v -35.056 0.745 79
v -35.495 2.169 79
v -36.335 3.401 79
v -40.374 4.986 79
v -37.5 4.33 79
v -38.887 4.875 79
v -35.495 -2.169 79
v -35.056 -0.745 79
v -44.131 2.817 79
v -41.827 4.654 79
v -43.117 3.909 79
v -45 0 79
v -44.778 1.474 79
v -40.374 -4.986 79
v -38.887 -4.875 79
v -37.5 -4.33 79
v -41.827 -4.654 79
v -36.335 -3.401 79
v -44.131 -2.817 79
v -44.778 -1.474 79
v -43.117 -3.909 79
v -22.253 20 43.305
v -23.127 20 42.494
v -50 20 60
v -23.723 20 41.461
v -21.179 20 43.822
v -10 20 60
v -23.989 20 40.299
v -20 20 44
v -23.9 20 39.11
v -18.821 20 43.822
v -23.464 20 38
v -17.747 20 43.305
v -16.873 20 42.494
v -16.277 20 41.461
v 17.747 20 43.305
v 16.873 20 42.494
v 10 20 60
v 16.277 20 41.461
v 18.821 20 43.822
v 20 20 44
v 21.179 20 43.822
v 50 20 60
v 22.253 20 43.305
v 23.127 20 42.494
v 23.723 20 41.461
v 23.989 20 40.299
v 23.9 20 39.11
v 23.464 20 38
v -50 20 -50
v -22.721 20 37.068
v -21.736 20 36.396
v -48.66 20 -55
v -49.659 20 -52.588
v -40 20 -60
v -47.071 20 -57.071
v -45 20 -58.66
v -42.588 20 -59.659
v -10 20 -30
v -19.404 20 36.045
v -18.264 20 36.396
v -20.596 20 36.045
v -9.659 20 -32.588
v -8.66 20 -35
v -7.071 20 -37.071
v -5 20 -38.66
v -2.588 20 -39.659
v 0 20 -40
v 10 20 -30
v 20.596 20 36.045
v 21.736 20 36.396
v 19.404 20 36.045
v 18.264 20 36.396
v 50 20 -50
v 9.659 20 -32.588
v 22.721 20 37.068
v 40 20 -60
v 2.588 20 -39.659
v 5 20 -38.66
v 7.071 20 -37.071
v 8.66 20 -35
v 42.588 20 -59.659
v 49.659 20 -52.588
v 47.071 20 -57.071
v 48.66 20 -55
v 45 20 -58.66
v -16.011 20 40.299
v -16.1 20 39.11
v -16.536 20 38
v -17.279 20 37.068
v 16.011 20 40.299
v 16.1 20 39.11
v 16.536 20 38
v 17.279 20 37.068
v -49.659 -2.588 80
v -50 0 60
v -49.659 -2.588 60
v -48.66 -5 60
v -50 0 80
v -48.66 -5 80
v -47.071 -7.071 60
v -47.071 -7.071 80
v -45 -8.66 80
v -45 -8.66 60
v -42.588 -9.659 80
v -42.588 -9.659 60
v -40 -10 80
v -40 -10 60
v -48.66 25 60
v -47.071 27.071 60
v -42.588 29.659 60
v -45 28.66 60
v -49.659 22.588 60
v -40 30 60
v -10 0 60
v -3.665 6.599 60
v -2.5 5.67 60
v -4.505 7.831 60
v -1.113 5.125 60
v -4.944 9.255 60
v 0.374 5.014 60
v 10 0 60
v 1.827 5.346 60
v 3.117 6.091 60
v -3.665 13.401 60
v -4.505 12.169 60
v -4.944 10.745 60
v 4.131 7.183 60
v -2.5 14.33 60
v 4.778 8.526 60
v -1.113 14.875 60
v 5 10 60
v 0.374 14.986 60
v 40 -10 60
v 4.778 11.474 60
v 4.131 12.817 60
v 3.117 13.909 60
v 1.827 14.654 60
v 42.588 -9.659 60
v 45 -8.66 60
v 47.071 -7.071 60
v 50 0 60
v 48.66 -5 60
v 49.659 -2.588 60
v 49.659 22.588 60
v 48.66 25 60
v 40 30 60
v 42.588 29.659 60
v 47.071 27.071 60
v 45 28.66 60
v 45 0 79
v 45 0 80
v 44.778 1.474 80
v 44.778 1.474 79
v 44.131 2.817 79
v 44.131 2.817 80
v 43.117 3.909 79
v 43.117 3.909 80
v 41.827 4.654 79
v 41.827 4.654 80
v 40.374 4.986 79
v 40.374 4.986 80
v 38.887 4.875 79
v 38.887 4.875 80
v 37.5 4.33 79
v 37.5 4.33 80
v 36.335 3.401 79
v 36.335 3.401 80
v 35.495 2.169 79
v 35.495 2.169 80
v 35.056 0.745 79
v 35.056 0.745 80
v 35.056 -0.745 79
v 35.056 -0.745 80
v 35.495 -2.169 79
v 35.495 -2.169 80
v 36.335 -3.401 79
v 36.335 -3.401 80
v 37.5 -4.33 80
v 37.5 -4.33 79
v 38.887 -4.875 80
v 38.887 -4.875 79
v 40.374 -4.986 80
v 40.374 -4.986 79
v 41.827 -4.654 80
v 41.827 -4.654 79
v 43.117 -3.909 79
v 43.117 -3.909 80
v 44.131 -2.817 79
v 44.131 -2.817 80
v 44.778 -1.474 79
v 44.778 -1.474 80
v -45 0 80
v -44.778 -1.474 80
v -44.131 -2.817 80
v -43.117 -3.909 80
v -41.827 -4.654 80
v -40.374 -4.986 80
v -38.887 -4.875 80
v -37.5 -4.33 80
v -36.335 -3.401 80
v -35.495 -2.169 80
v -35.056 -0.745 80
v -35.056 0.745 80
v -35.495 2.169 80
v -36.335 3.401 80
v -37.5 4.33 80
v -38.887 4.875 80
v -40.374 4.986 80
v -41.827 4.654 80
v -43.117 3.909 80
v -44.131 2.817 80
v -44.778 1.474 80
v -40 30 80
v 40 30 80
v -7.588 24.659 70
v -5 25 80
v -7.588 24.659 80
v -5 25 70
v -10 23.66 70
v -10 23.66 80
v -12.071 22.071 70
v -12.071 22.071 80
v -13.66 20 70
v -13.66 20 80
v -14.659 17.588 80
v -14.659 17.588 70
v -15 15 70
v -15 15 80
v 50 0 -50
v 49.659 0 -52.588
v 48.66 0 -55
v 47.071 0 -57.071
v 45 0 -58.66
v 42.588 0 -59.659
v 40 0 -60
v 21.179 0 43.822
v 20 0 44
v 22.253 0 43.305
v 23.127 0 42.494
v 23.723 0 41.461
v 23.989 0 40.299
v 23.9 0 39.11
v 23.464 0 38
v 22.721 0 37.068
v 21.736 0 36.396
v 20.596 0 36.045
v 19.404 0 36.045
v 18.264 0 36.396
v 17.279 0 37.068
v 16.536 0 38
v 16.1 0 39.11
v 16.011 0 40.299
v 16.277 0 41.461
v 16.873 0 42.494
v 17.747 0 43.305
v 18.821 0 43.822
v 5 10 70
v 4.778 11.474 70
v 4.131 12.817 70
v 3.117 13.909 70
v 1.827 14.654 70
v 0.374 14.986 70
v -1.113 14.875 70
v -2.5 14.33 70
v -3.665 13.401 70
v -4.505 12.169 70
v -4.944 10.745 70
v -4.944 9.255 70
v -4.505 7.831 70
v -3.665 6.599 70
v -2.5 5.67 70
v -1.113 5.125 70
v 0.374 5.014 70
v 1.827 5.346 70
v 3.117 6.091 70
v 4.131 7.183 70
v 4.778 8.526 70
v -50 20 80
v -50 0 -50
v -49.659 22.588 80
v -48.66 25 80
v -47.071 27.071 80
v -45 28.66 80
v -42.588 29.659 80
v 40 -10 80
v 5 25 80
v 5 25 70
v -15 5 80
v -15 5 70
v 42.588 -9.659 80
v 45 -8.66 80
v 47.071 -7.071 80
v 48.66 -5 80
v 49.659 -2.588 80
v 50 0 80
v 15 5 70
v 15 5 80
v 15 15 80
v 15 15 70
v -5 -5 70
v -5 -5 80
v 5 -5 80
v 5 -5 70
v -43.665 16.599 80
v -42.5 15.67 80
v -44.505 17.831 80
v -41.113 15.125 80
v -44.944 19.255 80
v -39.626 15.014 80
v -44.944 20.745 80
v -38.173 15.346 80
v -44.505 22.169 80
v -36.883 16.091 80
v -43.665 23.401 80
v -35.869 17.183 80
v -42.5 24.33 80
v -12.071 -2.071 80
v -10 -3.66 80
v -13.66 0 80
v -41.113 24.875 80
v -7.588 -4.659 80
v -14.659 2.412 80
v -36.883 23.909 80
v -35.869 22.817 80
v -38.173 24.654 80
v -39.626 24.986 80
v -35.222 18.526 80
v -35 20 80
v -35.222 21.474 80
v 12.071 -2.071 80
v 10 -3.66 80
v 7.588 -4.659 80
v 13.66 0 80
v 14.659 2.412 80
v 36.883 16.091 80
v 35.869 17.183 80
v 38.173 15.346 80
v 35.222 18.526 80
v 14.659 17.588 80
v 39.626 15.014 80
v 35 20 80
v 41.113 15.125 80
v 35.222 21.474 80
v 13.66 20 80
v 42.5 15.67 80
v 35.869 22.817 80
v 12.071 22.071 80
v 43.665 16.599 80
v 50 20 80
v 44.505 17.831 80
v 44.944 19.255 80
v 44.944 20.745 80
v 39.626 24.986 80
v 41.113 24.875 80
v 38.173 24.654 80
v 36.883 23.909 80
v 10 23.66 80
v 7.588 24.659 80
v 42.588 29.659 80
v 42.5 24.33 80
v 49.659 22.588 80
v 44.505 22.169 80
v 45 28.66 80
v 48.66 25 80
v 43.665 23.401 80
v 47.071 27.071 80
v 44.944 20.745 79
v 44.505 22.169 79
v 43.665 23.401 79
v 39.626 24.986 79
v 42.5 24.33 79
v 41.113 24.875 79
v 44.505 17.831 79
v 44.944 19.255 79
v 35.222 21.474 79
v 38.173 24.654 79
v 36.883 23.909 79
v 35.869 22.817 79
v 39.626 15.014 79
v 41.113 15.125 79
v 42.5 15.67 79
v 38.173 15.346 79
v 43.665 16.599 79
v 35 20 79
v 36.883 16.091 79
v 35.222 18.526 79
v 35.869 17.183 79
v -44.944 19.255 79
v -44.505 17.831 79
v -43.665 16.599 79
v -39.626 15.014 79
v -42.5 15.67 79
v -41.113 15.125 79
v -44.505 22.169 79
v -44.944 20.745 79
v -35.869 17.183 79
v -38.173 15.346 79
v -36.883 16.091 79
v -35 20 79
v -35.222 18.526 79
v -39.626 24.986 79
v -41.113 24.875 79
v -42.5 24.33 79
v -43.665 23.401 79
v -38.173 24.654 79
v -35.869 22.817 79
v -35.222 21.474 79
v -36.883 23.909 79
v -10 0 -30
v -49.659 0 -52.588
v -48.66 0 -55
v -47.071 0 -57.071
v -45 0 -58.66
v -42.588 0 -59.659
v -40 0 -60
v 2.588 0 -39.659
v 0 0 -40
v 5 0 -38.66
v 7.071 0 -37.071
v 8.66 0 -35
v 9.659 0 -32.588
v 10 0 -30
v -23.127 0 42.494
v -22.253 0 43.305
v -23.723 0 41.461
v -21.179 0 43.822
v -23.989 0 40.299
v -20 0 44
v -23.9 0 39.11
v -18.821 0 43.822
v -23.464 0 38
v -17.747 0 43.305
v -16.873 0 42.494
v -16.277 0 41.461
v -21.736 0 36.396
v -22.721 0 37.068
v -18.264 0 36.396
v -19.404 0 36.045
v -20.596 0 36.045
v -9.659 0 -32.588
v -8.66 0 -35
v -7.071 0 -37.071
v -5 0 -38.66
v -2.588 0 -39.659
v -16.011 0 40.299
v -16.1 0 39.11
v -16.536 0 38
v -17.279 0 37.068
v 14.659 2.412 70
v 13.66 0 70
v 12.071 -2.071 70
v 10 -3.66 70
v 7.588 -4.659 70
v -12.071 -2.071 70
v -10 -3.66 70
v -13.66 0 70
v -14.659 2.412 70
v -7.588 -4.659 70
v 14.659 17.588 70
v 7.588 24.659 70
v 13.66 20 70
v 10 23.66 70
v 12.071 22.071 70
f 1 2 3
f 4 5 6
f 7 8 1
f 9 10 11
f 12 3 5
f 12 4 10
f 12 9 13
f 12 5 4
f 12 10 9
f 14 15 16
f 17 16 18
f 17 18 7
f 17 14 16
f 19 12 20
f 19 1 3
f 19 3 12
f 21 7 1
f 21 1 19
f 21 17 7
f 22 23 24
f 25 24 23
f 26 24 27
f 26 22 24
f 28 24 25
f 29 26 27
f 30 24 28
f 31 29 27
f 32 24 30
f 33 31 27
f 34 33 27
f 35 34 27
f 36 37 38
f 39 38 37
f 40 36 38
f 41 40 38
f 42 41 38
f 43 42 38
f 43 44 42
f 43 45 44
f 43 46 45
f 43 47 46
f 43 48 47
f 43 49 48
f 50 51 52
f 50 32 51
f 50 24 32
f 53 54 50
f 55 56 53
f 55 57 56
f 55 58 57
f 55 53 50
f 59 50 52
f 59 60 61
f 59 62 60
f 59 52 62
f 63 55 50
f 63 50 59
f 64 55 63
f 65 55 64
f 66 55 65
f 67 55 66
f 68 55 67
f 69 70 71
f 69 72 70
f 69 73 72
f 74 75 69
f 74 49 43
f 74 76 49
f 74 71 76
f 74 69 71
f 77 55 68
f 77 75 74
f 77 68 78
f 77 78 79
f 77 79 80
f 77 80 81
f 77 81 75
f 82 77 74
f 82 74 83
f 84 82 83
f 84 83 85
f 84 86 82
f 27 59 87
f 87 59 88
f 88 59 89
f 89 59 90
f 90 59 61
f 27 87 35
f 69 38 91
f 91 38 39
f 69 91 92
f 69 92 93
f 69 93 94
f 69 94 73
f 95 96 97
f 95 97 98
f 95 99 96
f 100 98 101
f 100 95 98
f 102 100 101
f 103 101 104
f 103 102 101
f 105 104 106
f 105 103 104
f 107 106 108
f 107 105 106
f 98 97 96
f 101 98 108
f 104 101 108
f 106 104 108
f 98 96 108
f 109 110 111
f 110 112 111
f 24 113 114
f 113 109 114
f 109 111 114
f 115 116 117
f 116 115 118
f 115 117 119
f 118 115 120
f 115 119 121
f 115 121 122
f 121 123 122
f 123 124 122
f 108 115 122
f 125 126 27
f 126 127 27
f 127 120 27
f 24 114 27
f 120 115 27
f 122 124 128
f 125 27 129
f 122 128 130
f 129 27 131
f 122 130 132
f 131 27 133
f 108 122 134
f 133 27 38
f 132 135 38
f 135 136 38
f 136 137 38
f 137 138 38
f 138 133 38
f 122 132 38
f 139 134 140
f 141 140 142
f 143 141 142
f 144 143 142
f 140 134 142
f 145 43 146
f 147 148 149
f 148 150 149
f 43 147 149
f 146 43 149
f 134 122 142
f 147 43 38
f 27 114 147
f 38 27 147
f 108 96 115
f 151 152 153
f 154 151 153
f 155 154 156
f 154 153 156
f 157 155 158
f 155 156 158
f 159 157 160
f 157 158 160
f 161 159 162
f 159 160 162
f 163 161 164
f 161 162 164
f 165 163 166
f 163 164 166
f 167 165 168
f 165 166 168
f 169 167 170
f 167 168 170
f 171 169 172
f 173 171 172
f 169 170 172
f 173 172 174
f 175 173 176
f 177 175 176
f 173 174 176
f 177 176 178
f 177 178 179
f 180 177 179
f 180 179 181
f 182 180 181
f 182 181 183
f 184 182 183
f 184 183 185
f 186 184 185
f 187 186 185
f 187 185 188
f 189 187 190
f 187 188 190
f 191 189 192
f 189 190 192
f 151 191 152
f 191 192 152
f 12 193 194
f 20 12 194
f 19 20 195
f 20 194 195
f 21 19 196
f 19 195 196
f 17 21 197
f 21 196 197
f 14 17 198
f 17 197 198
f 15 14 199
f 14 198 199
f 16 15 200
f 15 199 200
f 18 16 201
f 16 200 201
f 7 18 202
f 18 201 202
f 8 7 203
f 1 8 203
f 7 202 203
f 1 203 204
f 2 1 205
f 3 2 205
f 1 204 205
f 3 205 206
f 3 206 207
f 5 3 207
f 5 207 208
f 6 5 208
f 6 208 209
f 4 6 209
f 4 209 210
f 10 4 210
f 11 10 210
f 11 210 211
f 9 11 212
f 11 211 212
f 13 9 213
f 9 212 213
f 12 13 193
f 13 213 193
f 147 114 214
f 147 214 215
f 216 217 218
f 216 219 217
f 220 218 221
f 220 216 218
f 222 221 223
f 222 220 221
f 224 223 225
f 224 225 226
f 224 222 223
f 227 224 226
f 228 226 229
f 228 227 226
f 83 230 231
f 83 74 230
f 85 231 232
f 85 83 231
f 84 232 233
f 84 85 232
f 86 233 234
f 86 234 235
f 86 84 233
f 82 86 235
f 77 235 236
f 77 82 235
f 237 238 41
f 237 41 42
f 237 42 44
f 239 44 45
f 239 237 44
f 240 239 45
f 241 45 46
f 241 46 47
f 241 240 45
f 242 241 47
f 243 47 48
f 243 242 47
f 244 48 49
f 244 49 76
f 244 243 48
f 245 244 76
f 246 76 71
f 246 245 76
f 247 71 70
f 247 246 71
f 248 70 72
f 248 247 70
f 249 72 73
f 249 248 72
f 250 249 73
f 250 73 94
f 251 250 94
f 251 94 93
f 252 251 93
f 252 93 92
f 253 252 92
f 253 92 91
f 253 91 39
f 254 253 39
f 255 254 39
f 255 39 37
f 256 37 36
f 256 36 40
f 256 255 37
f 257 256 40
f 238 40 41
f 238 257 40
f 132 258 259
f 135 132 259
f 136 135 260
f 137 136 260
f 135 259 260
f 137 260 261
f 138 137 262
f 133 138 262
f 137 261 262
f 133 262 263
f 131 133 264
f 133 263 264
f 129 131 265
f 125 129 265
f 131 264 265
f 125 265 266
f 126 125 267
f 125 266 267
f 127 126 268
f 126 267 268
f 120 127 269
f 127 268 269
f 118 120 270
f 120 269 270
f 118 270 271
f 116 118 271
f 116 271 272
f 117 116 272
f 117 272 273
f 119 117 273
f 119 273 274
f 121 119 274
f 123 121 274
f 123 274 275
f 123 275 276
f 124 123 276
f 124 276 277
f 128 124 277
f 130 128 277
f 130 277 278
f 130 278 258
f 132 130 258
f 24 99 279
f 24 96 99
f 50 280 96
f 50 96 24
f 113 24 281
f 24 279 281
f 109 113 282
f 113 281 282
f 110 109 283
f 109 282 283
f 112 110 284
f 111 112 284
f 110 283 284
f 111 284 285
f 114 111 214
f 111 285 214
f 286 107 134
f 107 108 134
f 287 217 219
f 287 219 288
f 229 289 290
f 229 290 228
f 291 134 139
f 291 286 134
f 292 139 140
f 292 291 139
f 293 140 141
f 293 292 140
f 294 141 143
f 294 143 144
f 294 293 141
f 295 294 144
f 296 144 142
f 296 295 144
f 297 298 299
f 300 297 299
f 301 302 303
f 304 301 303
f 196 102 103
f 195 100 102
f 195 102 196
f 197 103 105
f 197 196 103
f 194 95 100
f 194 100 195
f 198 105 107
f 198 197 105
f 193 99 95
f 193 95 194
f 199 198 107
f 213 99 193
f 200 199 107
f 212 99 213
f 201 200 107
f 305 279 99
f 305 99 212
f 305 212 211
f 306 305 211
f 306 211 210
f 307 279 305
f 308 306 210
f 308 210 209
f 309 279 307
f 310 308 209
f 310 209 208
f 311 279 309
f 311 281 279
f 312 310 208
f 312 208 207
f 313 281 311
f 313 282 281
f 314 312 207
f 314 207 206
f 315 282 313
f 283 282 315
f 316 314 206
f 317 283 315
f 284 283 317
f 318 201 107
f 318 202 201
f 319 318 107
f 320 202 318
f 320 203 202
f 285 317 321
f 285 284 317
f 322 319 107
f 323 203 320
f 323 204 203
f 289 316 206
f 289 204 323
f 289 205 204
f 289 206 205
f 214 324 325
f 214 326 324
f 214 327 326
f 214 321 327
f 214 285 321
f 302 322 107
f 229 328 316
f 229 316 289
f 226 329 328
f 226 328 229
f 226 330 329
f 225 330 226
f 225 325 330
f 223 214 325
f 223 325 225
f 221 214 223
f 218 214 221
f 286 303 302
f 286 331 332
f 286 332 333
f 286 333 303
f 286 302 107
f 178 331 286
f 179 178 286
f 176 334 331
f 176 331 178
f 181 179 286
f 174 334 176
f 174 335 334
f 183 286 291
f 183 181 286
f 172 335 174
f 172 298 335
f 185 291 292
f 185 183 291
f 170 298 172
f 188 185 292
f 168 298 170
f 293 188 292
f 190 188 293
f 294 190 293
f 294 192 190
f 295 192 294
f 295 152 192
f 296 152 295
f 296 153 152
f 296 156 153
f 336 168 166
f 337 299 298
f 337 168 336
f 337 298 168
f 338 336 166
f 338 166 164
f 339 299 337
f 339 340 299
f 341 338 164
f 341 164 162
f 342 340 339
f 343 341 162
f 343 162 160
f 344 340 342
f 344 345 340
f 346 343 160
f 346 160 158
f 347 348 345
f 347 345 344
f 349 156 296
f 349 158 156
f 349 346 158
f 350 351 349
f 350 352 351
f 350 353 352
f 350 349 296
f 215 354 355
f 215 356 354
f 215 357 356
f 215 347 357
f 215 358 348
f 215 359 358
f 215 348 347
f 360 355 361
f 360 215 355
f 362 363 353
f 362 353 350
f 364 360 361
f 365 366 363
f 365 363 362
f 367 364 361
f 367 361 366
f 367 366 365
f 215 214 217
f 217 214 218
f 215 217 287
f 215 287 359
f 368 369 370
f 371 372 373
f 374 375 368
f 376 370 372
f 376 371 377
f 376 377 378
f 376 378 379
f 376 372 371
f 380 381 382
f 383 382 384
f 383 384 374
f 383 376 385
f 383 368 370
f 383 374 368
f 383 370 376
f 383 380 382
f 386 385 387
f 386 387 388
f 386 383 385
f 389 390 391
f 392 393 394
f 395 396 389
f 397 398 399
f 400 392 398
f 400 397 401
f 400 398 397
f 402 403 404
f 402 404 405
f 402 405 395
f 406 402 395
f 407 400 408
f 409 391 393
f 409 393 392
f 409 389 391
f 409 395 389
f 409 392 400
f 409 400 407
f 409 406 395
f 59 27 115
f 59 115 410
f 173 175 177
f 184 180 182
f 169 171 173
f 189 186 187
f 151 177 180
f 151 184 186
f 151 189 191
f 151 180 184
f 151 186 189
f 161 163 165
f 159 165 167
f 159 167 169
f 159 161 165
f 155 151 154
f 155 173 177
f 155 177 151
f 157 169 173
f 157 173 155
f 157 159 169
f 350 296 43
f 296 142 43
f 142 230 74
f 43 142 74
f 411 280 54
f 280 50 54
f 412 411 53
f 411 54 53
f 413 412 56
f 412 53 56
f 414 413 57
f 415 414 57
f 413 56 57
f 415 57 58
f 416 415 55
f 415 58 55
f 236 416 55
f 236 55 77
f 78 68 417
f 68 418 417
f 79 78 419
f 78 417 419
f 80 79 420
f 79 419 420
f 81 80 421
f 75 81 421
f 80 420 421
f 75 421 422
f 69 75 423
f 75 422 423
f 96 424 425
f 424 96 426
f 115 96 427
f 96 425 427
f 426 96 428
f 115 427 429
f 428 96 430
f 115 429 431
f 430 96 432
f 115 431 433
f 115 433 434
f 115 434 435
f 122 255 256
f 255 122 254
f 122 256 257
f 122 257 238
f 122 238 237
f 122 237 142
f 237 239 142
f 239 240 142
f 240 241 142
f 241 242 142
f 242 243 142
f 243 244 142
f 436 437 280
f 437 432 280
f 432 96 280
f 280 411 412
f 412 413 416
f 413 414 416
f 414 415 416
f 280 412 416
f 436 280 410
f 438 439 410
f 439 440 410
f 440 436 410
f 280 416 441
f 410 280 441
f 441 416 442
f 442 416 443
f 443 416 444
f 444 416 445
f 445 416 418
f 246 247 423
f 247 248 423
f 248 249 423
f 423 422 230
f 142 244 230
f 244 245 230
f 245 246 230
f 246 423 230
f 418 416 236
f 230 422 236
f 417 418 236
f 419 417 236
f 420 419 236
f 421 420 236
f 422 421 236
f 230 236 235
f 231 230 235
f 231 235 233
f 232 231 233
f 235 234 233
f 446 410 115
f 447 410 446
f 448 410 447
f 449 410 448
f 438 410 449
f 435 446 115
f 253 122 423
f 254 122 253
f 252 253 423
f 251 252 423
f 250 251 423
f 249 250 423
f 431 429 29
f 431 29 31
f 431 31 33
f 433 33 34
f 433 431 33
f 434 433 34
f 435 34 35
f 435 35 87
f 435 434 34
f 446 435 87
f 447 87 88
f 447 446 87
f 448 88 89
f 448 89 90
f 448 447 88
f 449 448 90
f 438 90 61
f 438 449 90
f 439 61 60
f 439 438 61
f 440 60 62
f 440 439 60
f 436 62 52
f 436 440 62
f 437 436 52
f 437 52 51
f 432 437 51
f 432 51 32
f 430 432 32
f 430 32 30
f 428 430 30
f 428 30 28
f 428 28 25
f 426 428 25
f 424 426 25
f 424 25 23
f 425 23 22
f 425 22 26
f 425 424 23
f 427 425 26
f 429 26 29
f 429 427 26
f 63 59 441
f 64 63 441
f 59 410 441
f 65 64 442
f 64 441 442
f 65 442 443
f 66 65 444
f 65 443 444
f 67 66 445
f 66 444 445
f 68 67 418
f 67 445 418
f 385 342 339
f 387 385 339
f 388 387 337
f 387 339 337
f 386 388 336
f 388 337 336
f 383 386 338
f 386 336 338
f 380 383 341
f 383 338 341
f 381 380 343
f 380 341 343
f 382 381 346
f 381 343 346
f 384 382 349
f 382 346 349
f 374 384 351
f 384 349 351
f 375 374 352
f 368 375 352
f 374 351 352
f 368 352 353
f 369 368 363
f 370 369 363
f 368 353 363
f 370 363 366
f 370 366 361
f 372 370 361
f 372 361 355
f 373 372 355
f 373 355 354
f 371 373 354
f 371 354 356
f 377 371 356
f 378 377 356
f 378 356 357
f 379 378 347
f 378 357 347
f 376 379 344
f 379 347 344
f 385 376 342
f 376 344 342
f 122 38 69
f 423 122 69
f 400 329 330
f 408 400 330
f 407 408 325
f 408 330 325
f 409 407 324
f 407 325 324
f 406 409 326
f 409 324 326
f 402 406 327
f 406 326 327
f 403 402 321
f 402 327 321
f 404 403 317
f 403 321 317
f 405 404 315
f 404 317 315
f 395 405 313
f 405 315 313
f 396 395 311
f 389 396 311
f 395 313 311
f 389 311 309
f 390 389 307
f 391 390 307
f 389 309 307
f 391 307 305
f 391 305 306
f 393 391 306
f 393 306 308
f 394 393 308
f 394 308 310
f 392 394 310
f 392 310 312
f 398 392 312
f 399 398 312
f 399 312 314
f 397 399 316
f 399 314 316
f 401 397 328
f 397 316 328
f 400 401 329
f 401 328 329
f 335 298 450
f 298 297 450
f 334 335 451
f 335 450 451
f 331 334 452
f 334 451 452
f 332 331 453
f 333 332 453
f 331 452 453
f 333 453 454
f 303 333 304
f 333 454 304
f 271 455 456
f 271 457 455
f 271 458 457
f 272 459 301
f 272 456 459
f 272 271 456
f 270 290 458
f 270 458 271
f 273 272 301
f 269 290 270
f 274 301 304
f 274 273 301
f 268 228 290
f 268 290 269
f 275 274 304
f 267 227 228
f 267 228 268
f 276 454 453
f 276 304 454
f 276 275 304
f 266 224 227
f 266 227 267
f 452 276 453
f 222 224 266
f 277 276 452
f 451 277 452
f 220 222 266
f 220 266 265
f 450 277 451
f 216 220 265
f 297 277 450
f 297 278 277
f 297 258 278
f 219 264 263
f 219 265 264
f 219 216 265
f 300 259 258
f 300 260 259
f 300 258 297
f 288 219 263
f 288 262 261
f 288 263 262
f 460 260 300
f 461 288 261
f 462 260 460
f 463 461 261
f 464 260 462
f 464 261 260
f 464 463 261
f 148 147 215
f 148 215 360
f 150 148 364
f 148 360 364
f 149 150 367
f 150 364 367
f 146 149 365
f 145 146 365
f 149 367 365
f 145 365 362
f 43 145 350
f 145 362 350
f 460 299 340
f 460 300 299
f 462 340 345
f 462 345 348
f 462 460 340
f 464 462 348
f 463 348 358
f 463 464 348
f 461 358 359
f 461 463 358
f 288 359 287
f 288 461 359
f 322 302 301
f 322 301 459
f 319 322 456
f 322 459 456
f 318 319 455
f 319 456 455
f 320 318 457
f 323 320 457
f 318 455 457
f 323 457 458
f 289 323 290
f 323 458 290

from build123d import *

# Parameters (mm, degrees)
SKETCH_1_W          = 100
SKETCH_1_H          = 120
SKETCH_1_R          = 4
EXTRUDE_1_DEPTH     = 20
SKETCH_4_W          = 100
SKETCH_4_H          = 40
EXTRUDE_2_DEPTH     = 20
SKETCH_5_W          = 30
SKETCH_5_H          = 30
CUT_EXTRUDE_1_DEPTH = 10
SKETCH_7_R          = 5
CUT_EXTRUDE_3_DEPTH = 110
SKETCH_8_R          = 5
CUT_EXTRUDE_4_DEPTH = 1
SKETCH_9_W          = 20
SKETCH_9_H          = 100
CUT_EXTRUDE_6_DEPTH = 99.994949366
FILLET_5_R          = 10
FILLET_2_R          = 10
FILLET_1_R          = 10
FILLET_9_R          = 10


with BuildPart() as part:
    # ｽｹｯﾁ1 → ﾎﾞｽ - 押し出し1 (new body)
    with BuildSketch(Plane(origin=(0, 0, 0), x_dir=(1, 0, 0), z_dir=(0, 1, 0))):
        Rectangle(SKETCH_1_W, SKETCH_1_H)
        with Locations(Location((-20, -40, 0), (0, 0, 270))):
            Circle(SKETCH_1_R, mode=Mode.SUBTRACT)
        with Locations(Location((20, -40, 0), (0, 0, 270))):
            Circle(SKETCH_1_R, mode=Mode.SUBTRACT)
    extrude(amount=EXTRUDE_1_DEPTH)

    # ｽｹｯﾁ4 → ﾎﾞｽ - 押し出し2 (add)
    with BuildSketch(Plane.XY.offset(60)):
        with Locations((0, 10)):
            Rectangle(SKETCH_4_W, SKETCH_4_H)
    extrude(amount=EXTRUDE_2_DEPTH)

    # ｽｹｯﾁ5 → ｶｯﾄ - 押し出し1 (cut)
    with BuildSketch(Plane.XY.offset(80)):
        with Locations((0, 10)):
            Rectangle(SKETCH_5_W, SKETCH_5_H)
    extrude(amount=-CUT_EXTRUDE_1_DEPTH, mode=Mode.SUBTRACT)

    # ｽｹｯﾁ7 → ｶｯﾄ - 押し出し3 (cut)
    with BuildSketch(Plane.XY.offset(70)):
        with Locations((0, 10)):
            Circle(SKETCH_7_R)
    extrude(amount=-CUT_EXTRUDE_3_DEPTH, mode=Mode.SUBTRACT)

    # ｽｹｯﾁ8 → ｶｯﾄ - 押し出し4 (cut)
    with BuildSketch(Plane.XY.offset(80)):
        with Locations((-40, 20)):
            Circle(SKETCH_8_R)
        with Locations(Location((40, 20, 0), (0, 0, 180))):
            Circle(SKETCH_8_R)
        with Locations((40, 0)):
            Circle(SKETCH_8_R)
        with Locations(Location((-40, 0, 0), (0, 0, 180))):
            Circle(SKETCH_8_R)
    extrude(amount=-CUT_EXTRUDE_4_DEPTH, mode=Mode.SUBTRACT)

    # ｽｹｯﾁ9 → ｶｯﾄ - 押し出し6 (cut, through all)
    with BuildSketch(Plane(origin=(0, 20, 0), x_dir=(1, 0, 0), z_dir=(0, 1, 0))):
        with Locations((0, -10)):
            Rectangle(SKETCH_9_W, SKETCH_9_H)
    extrude(amount=-CUT_EXTRUDE_6_DEPTH, mode=Mode.SUBTRACT)

    # ﾌｨﾚｯﾄ5
    fillet_5_edges = [part.edges().sort_by_distance(p)[0] for p in [
        (15, 25, 75),
        (15, -5, 75),
        (-15, -5, 75),
        (-15, 25, 75),
    ]]
    fillet(fillet_5_edges, radius=FILLET_5_R)

    # ﾌｨﾚｯﾄ2
    fillet_2_edges = [part.edges().sort_by_distance(p)[0] for p in [
        (-50, 10, -60),
        (50, 10, -60),
    ]]
    fillet(fillet_2_edges, radius=FILLET_2_R)

    # ﾌｨﾚｯﾄ1
    fillet_1_edges = [part.edges().sort_by_distance(p)[0] for p in [
        (50, 30, 70),
        (50, -10, 70),
        (-50, -10, 70),
        (-50, 30, 70),
    ]]
    fillet(fillet_1_edges, radius=FILLET_1_R)

    # ﾌｨﾚｯﾄ9
    fillet_9_edges = [part.edges().sort_by_distance(p)[0] for p in [
        (-10, 10, -40),
        (10, 10, -40),
    ]]
    fillet(fillet_9_edges, radius=FILLET_9_R - 0.0001)  # a hair under: the kernel refuses the full size


solid = part.part
